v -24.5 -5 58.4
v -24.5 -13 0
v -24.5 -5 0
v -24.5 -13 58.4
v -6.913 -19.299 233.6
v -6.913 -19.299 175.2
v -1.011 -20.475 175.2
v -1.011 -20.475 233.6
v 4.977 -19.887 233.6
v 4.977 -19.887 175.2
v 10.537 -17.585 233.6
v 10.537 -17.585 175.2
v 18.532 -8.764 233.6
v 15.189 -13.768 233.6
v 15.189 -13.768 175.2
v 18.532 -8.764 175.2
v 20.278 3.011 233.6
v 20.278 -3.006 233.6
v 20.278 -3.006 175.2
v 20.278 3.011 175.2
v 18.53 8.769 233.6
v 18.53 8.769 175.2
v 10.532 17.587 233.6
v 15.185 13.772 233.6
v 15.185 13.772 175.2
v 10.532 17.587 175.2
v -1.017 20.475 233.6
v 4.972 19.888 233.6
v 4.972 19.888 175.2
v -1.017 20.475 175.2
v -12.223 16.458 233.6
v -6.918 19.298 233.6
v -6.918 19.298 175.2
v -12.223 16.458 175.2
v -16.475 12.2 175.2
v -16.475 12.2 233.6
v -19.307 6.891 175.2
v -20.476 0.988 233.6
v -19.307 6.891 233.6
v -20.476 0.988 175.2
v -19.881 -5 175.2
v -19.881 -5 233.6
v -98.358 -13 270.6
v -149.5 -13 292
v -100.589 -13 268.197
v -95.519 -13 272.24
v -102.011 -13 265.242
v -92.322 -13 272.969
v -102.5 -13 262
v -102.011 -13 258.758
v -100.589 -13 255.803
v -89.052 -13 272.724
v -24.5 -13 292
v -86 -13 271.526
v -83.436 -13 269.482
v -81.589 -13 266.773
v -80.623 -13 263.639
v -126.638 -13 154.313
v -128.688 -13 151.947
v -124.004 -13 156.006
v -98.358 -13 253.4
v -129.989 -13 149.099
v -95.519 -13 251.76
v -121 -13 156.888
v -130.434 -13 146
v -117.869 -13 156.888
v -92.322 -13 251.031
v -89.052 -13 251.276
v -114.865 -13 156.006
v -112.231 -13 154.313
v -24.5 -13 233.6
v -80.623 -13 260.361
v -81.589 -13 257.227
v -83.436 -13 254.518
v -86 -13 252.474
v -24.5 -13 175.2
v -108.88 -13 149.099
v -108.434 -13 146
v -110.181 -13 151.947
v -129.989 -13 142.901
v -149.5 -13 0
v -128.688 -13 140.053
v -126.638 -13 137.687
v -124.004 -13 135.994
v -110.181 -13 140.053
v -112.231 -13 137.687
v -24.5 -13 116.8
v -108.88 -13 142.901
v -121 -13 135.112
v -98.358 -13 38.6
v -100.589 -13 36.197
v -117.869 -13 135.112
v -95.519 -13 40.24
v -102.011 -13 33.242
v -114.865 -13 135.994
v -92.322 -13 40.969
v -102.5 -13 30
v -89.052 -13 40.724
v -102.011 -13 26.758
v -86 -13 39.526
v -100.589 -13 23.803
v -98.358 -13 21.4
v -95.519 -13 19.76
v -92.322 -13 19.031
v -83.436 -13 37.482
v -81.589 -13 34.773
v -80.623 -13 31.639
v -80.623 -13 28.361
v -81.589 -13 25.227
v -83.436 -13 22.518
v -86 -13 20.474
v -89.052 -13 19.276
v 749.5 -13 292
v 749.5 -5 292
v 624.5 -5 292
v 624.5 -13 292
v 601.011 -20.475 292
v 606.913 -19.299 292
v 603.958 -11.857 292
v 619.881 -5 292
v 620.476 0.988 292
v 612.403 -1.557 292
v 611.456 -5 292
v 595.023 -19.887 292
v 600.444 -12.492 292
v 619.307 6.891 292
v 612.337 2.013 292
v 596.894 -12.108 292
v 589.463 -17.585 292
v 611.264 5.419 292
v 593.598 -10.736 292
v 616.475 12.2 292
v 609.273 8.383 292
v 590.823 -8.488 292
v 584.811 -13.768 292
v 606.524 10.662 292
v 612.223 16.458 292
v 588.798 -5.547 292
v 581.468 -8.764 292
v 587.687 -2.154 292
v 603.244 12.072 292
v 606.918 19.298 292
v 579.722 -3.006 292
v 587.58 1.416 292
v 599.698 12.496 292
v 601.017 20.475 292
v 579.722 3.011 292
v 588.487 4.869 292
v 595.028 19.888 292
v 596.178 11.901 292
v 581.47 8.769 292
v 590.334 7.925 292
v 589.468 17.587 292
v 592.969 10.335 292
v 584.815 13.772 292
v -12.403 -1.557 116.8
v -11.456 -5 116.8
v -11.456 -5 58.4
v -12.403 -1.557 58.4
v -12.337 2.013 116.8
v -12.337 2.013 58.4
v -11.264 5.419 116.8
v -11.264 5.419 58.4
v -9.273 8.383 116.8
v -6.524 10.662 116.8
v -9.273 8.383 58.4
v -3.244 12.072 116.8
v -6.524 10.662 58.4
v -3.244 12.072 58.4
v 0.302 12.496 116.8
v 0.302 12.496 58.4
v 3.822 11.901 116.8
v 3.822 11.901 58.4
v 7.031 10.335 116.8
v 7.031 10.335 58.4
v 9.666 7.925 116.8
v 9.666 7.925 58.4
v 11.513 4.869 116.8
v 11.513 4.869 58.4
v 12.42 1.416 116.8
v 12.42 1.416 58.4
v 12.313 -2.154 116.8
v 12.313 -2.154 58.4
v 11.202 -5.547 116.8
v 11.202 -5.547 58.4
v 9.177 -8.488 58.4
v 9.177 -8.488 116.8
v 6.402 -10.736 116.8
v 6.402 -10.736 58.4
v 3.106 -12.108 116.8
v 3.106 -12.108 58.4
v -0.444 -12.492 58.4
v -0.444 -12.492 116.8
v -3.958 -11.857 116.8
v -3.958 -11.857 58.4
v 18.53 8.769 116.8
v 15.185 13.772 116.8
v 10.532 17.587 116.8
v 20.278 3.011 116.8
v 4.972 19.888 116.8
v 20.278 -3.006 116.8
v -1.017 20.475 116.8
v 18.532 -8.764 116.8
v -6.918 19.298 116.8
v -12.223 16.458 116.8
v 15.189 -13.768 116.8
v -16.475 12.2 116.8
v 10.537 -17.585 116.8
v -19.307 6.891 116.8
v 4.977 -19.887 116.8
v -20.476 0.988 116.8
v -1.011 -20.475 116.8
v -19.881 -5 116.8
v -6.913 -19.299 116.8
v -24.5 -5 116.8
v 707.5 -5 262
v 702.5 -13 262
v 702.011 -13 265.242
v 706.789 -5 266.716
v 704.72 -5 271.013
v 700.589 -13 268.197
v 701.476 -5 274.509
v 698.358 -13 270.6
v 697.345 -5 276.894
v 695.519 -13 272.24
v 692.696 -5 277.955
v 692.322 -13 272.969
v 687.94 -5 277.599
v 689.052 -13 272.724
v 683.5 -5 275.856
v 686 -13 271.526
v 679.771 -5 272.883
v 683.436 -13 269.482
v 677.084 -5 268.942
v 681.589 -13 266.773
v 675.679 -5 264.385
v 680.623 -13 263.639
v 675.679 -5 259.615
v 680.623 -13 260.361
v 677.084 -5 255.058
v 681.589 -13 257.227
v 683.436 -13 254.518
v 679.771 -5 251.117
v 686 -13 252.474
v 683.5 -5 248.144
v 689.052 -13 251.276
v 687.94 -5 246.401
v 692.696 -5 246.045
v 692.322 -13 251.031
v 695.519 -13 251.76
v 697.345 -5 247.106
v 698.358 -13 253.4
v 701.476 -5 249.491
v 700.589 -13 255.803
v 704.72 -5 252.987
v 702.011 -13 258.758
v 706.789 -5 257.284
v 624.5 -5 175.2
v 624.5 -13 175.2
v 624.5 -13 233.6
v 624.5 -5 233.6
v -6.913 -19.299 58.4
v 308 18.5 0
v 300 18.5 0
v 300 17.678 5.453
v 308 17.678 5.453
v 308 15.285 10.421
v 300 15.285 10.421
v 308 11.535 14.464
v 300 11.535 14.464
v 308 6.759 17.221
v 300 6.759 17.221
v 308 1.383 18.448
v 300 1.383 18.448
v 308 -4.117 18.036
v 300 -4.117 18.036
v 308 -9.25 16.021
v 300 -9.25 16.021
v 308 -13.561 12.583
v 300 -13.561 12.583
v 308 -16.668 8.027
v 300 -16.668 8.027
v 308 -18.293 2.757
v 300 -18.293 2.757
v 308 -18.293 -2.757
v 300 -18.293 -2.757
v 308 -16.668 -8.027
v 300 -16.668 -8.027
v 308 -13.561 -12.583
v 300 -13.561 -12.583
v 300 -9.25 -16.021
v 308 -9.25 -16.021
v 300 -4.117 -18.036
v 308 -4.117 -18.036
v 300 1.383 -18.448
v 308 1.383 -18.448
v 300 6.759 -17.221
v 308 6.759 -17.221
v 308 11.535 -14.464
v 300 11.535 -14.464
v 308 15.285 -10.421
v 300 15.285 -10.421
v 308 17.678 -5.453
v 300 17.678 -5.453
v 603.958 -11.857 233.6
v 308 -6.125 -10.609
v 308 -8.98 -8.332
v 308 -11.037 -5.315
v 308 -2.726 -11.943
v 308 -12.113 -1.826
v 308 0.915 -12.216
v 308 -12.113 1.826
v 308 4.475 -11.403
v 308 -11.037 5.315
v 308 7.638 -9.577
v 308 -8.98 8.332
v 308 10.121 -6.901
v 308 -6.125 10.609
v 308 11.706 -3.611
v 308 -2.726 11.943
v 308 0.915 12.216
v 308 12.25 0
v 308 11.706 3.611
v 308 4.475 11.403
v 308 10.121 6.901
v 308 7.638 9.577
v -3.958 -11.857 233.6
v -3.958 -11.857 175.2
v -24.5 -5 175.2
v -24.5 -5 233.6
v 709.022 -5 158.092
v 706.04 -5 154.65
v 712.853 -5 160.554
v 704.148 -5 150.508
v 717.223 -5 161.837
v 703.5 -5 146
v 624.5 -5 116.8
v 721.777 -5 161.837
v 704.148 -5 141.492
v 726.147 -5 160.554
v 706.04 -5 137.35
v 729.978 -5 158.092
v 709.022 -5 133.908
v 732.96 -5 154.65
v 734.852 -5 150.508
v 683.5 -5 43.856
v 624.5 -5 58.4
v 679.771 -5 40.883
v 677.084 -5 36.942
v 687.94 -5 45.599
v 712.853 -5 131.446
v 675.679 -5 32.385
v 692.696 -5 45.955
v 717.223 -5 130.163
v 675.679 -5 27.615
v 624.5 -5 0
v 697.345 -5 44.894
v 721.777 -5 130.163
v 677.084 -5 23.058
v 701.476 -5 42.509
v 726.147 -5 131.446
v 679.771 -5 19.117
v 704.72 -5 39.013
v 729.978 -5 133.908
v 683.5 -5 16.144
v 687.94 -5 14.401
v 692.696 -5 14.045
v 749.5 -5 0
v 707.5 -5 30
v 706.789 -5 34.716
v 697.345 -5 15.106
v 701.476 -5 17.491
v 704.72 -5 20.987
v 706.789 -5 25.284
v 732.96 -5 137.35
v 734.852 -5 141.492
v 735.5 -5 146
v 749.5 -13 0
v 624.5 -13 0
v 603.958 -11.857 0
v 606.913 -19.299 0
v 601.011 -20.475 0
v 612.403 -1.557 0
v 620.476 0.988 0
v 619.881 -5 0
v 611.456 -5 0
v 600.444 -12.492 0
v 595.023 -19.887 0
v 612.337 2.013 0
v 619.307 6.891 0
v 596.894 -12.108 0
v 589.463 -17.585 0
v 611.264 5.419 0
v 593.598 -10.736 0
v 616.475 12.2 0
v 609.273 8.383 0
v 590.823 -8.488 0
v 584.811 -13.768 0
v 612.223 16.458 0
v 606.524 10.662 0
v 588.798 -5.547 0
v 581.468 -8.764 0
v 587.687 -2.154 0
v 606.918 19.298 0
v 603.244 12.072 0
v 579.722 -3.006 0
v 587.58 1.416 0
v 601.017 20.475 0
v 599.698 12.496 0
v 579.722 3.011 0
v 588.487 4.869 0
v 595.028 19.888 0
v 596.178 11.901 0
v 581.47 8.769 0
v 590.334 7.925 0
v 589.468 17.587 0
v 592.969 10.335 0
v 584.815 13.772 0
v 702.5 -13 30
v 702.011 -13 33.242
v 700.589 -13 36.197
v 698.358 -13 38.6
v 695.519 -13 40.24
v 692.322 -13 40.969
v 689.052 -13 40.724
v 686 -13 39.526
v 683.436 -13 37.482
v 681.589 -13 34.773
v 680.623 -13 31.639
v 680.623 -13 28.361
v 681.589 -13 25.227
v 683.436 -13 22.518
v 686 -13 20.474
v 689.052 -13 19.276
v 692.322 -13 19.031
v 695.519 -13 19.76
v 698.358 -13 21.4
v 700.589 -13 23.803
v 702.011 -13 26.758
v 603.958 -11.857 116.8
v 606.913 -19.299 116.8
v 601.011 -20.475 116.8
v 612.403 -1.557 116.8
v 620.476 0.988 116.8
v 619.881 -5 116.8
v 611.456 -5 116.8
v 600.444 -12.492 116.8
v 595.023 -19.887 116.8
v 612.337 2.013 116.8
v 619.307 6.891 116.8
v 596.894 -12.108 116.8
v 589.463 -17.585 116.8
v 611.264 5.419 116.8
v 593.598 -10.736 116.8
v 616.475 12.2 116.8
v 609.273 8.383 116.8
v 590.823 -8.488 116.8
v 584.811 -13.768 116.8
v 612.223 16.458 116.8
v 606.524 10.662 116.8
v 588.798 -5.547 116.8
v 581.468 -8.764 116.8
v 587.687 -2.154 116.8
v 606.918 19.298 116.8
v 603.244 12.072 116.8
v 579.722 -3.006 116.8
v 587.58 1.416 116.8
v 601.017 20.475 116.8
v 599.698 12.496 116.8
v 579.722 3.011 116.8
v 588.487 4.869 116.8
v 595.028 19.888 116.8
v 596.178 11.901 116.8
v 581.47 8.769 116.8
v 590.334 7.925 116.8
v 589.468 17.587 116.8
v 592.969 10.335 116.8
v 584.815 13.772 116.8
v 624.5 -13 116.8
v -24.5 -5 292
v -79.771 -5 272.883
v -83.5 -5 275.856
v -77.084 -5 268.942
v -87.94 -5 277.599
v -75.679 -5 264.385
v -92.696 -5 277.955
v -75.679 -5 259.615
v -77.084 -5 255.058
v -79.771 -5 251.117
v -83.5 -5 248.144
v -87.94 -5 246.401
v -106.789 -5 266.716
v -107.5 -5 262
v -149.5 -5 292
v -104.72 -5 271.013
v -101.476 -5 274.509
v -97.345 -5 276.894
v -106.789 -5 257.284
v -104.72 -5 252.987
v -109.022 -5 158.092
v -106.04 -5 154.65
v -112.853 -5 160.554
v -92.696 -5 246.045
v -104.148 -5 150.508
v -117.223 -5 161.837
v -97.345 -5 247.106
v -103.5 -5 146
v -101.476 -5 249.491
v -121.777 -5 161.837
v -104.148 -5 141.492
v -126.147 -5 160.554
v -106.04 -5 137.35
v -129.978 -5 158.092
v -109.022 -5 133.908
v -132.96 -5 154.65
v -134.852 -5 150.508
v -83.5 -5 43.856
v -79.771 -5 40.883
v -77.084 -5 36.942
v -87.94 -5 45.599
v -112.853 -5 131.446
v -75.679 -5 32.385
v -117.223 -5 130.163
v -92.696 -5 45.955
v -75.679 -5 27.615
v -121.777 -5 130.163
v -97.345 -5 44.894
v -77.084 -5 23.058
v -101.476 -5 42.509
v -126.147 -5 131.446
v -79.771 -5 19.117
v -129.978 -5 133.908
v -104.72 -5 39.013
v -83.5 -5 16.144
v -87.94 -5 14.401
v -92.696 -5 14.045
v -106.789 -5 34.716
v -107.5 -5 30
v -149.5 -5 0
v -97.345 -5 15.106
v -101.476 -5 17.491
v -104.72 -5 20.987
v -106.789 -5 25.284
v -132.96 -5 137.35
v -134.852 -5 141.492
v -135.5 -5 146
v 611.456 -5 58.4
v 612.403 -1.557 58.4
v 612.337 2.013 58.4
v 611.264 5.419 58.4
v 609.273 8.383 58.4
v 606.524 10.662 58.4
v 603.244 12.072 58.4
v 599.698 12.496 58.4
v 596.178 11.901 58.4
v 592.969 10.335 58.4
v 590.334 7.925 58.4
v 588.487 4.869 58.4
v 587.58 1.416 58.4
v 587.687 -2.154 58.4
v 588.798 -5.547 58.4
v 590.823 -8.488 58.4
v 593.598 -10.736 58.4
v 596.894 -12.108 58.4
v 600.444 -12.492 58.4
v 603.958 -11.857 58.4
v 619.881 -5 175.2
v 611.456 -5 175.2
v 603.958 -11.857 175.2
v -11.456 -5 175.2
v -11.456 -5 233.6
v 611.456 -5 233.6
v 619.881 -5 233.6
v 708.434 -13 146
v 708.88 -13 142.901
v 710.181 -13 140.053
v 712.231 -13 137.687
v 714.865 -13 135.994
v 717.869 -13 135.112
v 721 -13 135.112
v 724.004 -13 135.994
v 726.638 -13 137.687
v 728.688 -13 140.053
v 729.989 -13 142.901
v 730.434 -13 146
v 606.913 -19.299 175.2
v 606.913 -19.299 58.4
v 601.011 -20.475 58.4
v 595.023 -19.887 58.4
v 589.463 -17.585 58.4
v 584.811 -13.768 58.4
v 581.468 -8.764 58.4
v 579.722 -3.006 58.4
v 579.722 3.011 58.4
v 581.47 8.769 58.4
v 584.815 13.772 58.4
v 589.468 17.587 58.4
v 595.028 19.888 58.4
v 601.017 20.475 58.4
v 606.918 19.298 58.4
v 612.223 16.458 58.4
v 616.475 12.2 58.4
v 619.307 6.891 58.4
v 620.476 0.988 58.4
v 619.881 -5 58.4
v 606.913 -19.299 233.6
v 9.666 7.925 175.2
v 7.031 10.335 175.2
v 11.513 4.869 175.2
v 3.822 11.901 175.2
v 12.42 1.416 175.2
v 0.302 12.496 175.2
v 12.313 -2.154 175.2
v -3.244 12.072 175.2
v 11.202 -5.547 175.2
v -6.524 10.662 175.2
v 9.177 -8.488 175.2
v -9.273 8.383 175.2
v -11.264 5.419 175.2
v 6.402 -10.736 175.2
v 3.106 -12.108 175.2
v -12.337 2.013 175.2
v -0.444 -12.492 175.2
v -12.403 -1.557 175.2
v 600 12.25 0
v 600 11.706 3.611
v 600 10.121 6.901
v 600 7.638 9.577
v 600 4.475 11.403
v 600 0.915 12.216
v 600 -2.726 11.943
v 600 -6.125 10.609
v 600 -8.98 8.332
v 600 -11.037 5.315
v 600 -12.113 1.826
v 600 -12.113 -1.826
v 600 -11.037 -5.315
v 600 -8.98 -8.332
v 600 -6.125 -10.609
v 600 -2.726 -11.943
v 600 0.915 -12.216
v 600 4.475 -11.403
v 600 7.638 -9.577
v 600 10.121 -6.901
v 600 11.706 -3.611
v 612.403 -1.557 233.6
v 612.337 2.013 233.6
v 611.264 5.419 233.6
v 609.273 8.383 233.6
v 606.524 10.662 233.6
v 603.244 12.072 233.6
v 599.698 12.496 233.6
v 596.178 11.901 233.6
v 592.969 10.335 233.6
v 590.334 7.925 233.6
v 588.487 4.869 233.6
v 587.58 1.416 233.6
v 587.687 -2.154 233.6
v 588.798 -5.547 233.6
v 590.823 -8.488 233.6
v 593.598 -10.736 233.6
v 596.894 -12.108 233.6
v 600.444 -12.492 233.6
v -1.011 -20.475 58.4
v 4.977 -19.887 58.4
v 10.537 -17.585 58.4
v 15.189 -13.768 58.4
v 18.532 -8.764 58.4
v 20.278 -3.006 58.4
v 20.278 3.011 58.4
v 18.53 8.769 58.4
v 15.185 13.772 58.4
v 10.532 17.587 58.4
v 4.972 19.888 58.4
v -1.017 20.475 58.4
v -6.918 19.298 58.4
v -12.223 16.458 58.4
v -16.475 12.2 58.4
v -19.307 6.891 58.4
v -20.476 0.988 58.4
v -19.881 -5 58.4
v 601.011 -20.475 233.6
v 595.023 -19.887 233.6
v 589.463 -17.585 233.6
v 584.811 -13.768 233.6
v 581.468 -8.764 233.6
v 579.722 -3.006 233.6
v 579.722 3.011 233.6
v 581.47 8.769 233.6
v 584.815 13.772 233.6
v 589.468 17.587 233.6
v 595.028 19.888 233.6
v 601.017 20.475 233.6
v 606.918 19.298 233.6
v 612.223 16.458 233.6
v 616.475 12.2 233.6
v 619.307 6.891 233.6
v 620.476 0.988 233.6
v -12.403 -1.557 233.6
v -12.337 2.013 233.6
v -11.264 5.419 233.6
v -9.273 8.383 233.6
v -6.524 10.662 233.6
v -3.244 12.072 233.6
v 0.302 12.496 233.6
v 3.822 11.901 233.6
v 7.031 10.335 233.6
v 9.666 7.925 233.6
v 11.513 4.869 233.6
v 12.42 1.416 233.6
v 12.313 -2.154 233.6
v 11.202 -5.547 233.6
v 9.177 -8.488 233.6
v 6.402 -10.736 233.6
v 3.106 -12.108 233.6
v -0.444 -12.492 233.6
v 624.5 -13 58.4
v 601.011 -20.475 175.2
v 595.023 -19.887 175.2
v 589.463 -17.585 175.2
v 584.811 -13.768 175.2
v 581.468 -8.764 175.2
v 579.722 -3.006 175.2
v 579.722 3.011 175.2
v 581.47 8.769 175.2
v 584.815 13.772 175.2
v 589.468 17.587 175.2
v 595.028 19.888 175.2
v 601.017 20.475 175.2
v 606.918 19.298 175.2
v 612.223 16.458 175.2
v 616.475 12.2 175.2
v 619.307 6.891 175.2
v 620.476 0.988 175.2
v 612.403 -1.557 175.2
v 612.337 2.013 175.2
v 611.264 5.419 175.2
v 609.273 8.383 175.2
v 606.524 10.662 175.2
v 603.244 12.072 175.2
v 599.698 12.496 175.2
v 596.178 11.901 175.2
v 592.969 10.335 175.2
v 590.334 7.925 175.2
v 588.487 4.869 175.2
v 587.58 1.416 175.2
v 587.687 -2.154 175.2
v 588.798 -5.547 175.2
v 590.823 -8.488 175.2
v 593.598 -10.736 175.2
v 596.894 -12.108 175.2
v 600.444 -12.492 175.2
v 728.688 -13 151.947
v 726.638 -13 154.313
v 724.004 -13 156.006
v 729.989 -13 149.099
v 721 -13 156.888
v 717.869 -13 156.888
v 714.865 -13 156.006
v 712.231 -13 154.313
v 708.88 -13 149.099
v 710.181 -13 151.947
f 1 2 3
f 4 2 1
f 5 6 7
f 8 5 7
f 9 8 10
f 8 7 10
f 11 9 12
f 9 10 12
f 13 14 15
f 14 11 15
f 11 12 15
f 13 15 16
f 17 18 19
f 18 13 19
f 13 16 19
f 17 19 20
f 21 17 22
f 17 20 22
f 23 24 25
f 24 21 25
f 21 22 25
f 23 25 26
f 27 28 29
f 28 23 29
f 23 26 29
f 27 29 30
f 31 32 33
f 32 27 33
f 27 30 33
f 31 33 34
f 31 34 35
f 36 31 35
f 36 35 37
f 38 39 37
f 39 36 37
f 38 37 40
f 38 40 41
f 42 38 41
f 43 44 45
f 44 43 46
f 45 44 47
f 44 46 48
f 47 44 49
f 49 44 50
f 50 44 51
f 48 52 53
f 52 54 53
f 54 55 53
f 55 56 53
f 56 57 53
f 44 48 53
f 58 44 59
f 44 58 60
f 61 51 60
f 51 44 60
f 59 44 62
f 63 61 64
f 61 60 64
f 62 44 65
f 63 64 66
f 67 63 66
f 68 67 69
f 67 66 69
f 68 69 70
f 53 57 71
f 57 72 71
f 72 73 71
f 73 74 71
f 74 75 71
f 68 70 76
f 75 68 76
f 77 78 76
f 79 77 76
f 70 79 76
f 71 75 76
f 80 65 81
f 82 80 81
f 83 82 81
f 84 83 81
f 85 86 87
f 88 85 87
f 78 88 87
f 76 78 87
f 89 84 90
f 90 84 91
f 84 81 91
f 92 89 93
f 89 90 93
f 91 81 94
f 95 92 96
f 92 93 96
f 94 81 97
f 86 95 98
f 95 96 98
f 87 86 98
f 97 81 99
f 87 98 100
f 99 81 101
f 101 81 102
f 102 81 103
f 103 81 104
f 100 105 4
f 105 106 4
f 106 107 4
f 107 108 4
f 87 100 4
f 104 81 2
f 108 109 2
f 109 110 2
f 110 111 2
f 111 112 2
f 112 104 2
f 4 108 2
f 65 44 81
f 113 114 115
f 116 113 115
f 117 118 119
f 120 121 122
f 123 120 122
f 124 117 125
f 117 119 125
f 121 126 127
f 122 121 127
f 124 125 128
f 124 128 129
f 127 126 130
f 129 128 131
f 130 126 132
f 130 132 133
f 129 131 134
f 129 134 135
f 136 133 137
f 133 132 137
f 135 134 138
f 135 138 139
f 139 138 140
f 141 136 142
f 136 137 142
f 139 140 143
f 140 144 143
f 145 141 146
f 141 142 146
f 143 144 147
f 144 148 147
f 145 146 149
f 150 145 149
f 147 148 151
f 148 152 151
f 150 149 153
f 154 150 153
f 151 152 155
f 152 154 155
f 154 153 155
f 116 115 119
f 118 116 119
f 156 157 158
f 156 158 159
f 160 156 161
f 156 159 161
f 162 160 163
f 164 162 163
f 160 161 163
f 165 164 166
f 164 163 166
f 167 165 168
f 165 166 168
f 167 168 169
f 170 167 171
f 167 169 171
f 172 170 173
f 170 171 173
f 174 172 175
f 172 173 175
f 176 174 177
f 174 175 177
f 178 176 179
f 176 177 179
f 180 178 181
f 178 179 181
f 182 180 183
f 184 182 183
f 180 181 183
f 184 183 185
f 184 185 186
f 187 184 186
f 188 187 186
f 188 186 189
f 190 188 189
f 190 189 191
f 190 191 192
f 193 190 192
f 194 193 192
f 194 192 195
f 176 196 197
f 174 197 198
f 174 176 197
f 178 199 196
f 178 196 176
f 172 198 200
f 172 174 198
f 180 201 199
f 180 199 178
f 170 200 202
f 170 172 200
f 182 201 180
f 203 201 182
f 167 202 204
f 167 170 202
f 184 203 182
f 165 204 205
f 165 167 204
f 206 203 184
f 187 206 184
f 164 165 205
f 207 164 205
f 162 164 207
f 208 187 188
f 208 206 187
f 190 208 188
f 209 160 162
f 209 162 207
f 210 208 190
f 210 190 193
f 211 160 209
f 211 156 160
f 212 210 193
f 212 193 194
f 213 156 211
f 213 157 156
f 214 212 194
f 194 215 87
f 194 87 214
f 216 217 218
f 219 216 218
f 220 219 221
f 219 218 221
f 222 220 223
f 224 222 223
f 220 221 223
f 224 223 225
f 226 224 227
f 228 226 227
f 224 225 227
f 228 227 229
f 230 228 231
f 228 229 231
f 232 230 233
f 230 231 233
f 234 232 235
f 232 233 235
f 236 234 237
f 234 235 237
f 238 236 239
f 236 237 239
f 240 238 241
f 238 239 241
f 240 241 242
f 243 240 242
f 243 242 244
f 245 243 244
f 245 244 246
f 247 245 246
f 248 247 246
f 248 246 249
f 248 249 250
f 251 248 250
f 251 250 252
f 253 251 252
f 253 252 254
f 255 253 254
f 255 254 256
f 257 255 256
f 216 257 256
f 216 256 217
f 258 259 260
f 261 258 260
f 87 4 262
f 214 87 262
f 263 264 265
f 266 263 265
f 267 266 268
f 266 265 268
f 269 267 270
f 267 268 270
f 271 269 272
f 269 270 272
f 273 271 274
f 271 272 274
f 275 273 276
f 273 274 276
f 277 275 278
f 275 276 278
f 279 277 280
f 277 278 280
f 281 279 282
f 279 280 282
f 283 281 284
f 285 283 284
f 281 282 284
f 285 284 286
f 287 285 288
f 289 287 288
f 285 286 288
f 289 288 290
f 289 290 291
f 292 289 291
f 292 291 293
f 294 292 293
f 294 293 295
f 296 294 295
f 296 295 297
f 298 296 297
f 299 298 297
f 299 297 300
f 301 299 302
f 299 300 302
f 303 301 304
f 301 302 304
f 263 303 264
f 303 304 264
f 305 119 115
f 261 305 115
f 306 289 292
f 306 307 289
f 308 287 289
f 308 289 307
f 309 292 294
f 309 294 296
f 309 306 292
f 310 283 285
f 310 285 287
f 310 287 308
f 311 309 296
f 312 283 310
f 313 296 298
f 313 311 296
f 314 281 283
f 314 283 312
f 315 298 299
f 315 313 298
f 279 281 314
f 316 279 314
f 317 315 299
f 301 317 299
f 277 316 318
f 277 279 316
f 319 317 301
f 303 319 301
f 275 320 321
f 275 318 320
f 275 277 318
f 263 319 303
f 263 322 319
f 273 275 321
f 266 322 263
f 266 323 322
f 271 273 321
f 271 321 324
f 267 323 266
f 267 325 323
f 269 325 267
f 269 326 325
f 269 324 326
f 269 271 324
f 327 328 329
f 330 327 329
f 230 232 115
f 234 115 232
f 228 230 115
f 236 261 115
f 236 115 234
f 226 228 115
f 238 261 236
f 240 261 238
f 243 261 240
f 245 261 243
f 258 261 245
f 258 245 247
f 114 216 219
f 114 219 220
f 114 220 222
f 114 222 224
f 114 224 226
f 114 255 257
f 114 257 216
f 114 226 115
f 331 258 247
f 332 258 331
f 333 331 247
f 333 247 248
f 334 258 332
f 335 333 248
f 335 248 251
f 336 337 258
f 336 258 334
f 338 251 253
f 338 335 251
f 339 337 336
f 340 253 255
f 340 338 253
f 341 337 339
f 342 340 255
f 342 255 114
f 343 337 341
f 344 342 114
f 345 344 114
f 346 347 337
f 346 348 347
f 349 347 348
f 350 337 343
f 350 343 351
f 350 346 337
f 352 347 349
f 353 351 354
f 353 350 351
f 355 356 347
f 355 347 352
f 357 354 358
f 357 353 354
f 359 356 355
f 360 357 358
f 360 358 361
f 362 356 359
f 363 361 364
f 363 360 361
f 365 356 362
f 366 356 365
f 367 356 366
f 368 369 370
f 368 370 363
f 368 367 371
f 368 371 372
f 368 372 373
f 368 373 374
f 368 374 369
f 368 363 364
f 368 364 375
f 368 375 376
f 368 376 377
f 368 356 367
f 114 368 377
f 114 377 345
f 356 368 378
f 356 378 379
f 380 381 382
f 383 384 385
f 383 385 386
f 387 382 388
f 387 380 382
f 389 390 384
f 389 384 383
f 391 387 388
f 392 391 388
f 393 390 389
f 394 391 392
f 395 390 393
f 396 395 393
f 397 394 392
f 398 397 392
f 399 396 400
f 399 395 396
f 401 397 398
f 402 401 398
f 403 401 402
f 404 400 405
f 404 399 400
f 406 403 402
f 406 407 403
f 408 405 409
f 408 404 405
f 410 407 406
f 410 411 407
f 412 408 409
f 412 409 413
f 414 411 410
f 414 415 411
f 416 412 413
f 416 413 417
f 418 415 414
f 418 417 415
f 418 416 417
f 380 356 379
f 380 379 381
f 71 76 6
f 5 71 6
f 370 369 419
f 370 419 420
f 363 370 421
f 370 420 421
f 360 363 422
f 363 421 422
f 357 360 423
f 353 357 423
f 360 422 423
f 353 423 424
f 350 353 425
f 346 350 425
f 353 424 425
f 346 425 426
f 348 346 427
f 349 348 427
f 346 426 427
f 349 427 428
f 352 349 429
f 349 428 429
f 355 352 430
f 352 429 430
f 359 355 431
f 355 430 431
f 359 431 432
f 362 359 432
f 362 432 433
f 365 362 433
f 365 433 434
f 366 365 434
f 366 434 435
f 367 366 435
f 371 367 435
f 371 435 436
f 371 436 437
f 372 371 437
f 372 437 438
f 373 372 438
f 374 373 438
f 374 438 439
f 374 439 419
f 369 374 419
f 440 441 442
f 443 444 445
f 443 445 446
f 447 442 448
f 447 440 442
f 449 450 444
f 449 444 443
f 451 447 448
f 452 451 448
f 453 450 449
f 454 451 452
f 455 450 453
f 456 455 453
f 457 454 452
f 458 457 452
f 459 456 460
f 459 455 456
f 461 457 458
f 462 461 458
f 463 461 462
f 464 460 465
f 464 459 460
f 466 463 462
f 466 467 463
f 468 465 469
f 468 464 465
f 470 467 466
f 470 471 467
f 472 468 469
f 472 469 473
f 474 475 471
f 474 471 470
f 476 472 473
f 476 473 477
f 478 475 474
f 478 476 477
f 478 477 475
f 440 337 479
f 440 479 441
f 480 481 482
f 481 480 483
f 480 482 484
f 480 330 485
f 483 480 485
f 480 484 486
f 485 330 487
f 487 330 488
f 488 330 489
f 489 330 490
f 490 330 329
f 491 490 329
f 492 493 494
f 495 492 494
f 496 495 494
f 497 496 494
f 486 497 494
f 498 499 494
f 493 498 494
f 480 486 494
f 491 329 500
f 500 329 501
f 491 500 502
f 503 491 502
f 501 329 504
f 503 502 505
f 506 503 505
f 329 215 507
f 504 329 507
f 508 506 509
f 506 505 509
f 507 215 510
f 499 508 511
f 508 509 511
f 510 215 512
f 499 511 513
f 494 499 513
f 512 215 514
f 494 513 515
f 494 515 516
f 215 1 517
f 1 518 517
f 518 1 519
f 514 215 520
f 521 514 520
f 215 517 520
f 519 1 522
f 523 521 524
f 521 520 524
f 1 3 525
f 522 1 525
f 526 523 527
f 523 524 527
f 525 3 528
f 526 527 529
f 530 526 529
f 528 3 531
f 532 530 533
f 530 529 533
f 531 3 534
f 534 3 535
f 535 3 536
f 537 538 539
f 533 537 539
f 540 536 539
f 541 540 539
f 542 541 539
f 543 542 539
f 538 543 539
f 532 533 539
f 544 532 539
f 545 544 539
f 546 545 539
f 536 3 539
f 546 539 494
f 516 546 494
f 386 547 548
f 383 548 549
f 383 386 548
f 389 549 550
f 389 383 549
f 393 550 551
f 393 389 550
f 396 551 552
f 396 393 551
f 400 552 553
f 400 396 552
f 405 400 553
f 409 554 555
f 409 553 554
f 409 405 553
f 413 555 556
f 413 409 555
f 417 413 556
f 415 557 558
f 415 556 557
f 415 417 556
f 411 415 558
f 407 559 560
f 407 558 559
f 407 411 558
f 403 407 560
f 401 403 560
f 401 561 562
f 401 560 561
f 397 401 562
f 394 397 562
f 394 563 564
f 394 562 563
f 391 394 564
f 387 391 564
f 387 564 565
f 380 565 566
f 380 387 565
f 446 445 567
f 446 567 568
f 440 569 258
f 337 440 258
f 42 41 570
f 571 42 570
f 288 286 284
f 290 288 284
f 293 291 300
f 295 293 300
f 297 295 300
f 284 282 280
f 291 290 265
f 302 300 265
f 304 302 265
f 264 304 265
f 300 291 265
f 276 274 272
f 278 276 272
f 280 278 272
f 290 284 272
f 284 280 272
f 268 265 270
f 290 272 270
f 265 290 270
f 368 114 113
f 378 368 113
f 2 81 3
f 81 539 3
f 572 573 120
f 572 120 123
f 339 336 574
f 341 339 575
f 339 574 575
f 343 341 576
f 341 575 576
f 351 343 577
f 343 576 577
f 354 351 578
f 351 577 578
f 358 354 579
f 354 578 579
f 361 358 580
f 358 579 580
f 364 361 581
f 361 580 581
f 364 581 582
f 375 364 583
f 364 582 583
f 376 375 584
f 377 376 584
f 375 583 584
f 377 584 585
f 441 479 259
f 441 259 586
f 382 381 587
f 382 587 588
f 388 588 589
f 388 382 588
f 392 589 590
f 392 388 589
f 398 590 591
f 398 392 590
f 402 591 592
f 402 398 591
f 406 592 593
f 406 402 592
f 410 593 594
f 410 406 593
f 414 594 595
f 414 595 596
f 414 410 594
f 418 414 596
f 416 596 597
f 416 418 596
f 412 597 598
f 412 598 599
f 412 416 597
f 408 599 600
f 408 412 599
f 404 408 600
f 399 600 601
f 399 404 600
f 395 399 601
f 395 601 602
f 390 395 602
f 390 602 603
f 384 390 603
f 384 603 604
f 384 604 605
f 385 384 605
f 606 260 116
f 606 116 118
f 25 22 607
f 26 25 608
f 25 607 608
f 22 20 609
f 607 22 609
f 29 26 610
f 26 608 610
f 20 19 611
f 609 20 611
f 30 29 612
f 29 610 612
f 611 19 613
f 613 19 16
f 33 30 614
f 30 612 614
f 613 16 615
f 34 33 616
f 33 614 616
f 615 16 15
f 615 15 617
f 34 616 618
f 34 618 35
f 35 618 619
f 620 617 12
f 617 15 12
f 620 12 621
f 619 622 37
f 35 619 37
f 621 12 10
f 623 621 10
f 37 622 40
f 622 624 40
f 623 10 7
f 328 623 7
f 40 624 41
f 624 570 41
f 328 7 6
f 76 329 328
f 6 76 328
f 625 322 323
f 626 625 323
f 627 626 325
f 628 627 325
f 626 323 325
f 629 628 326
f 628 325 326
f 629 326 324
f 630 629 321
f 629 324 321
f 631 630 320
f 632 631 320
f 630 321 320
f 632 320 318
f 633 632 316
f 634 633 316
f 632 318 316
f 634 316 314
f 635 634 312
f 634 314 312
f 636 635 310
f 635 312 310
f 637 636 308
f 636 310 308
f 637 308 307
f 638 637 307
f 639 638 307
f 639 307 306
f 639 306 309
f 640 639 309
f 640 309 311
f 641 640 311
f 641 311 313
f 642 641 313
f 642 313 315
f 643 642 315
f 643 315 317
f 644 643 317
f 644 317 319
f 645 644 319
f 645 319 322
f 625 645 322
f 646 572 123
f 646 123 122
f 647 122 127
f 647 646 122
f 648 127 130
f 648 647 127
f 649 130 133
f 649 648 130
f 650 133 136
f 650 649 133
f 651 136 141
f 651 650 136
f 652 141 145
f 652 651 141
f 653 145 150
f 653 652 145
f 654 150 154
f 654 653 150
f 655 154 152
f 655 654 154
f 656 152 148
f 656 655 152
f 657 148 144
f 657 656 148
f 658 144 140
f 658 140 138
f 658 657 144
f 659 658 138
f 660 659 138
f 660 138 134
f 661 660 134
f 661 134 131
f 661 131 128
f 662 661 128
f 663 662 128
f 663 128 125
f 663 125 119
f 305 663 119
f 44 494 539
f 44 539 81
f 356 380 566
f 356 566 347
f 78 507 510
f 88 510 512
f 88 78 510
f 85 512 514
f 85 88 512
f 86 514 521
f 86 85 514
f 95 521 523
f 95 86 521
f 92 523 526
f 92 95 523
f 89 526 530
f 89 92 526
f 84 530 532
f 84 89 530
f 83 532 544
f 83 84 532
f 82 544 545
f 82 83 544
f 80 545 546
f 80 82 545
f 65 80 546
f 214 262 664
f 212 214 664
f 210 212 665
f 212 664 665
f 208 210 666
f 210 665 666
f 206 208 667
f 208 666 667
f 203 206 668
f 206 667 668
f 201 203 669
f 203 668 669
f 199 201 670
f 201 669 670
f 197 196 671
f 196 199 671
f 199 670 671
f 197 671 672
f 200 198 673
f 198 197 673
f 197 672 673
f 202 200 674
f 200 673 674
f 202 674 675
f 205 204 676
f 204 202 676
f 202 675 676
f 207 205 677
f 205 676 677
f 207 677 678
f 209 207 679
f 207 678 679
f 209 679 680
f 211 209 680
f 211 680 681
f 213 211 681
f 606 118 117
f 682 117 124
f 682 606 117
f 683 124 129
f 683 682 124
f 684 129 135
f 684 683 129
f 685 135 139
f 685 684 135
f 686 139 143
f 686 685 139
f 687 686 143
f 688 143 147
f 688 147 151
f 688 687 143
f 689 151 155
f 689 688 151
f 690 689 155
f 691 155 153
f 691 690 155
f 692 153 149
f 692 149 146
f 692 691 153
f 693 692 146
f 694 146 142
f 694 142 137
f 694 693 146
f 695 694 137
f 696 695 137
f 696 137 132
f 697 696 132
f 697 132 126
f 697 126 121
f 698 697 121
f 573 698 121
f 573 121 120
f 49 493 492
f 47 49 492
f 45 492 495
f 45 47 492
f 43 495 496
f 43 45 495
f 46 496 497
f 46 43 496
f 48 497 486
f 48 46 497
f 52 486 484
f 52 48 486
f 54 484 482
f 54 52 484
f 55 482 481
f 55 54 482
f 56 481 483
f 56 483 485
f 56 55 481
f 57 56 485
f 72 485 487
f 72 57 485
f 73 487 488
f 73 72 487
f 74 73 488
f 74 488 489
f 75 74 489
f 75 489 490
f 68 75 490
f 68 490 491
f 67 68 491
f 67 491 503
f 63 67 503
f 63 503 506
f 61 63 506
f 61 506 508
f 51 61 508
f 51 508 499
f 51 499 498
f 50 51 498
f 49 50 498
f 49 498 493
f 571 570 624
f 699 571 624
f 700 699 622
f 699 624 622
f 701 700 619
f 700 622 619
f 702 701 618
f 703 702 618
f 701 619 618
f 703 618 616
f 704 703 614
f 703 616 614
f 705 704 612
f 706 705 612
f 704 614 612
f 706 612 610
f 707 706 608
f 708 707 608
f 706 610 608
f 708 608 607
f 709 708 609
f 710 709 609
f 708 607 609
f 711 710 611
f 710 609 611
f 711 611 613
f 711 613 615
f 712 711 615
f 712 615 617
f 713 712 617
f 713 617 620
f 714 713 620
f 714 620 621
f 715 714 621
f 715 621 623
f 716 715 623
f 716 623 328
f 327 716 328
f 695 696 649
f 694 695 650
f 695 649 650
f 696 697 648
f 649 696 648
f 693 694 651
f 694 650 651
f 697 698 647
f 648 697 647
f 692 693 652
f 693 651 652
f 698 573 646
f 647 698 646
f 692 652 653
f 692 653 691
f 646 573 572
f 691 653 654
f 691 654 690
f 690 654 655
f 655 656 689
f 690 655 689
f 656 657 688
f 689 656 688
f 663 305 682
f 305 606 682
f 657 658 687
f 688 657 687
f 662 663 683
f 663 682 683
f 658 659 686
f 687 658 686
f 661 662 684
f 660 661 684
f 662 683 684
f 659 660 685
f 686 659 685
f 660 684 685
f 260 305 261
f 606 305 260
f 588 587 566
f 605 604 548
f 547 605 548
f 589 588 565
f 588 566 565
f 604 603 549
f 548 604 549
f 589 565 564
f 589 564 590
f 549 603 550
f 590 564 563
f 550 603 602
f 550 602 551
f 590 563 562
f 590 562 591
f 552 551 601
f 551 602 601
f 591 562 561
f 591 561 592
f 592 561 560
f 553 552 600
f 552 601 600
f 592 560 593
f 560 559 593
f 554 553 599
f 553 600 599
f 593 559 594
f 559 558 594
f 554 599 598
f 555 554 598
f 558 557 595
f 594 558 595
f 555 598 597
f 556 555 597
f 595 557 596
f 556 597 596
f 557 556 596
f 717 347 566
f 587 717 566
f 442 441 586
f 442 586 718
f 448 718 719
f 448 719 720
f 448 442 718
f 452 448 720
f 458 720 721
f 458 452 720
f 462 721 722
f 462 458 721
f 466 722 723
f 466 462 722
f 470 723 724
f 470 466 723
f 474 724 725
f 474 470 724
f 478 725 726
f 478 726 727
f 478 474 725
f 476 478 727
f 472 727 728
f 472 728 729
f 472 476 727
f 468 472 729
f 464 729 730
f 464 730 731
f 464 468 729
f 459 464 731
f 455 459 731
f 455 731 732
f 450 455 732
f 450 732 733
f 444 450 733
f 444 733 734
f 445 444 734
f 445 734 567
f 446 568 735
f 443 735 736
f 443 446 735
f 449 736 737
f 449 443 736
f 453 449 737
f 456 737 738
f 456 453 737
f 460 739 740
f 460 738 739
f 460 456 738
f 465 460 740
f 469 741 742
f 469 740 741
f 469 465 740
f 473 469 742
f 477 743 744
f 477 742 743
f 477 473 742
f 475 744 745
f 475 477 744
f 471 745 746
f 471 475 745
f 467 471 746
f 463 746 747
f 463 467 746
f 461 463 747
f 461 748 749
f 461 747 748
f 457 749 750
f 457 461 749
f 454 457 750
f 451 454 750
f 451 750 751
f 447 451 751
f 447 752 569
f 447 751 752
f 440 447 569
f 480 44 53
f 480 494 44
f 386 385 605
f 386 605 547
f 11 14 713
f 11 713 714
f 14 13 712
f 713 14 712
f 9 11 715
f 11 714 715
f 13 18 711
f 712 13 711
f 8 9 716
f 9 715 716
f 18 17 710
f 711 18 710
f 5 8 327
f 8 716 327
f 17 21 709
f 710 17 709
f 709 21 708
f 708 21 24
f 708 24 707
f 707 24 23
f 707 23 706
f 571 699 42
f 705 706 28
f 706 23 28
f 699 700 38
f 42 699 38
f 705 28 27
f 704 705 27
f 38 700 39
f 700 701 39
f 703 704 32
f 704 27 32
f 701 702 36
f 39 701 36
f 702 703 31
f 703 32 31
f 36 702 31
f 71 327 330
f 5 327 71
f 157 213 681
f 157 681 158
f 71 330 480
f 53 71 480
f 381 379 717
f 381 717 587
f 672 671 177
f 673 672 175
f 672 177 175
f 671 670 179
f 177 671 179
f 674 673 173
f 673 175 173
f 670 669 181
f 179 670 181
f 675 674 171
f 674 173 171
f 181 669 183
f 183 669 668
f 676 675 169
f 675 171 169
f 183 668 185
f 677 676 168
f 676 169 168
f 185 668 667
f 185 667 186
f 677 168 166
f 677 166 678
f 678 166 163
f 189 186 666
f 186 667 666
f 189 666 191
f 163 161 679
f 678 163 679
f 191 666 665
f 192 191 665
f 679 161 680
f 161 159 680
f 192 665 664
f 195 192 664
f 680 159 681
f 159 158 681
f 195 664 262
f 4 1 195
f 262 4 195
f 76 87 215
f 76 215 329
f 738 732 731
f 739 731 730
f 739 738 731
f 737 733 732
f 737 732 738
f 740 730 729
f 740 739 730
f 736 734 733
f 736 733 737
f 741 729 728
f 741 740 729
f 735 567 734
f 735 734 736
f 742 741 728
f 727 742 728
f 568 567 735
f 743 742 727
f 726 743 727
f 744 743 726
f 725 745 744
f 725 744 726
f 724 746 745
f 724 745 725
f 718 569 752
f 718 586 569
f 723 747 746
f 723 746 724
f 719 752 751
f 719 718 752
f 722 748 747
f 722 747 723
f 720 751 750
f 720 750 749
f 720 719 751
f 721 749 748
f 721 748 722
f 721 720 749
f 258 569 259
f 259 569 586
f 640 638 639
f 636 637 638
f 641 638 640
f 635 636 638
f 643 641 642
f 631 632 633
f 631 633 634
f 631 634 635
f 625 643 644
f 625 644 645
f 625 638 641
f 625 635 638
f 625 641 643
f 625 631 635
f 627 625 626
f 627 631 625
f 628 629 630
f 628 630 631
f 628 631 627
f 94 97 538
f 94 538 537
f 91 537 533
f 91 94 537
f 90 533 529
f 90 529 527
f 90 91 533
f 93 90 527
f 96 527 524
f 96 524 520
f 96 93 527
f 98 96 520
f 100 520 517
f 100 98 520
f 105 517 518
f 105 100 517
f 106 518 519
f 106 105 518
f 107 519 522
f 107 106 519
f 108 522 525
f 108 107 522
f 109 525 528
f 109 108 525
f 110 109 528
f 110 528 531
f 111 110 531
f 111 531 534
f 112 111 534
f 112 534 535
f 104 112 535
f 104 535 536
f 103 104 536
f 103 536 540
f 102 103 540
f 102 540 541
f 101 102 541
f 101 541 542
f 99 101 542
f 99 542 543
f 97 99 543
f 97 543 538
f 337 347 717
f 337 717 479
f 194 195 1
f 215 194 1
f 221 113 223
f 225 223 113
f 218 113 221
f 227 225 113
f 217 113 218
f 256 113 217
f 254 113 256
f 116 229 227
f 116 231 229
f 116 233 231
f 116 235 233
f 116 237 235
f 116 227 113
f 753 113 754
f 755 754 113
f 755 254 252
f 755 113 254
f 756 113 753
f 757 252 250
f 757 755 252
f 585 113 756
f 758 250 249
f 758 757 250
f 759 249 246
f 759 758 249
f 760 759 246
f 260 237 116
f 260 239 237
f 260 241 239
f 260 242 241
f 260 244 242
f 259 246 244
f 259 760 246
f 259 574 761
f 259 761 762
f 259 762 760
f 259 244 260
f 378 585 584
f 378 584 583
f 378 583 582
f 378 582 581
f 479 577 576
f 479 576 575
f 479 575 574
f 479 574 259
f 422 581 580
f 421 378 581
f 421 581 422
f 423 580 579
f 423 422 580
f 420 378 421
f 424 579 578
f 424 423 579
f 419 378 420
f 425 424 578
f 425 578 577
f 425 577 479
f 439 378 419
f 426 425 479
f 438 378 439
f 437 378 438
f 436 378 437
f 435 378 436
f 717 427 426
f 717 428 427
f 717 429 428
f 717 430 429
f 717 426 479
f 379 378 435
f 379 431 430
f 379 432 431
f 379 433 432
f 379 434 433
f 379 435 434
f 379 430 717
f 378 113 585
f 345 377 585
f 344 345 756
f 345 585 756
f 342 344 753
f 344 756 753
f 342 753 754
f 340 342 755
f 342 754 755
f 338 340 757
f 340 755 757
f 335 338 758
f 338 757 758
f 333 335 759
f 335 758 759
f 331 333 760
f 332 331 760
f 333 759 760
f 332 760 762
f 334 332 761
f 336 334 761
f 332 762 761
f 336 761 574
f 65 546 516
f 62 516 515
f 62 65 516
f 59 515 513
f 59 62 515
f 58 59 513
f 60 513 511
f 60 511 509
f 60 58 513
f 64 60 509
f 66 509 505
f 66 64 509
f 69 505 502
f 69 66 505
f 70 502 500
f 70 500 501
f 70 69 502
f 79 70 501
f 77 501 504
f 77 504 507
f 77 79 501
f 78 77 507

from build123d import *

# Parameters (mm, degrees)
F1_DEPTH  = 292
F2_R      = 16
F3_R      = 11
F10_W     = 50
F10_H     = 58.4
F11_DEPTH = 50
F7_W      = 50
F7_H      = 58.4
F12_DEPTH = 50
F13_R     = 12.25
F14_DEPTH = 300
F13_R_2   = 18.5
F15_DEPTH = 8


with BuildPart() as f1:
    # F0 (on Top) → F1 (new body)
    with BuildSketch(Plane.XY):
        with BuildLine():
            Line((-24.5, -13), (-6.9125695665, -19.2993881247))
            ThreePointArc((-6.9125695665, -19.2993881247), (15.1852087826, 13.7716895924), (-19.8808953521, -5))
            Line((-19.8808953521, -5), (-11.4564392374, -5))
            ThreePointArc((-11.4564392374, -5), (8.4352692932, 9.2247618913), (-3.9577761068, -11.8568970767))
            Line((-3.9577761068, -11.8568970767), (-24.5, -5))
            Line((-24.5, -5), (-149.5, -5))
            Line((-149.5, -5), (-149.5, -13))
            Line((-149.5, -13), (-24.5, -13))
        make_face()
    extrude(amount=F1_DEPTH)

    # F2 (on face) → F4 section 0
    with BuildSketch(Plane(origin=(0, -5, 0), x_dir=(-1, 0, 0), z_dir=(0, 1, 0))):
        with Locations((91.5, 262)):
            Circle(F2_R)
    # F3 (on face) → F4 section 1
    with BuildSketch(Plane.XZ.offset(13)):
        with Locations((-91.5, 262)):
            Circle(F3_R)
    loft(mode=Mode.SUBTRACT)

    # F2 (on face) → F5 section 0
    with BuildSketch(Plane(origin=(0, -5, 0), x_dir=(-1, 0, 0), z_dir=(0, 1, 0))):
        with Locations((119.5, 146)):
            Circle(F2_R)
    # F3 (on face) → F5 section 1
    with BuildSketch(Plane.XZ.offset(13)):
        with Locations((-119.4343939424, 146)):
            Circle(F3_R)
    loft(mode=Mode.SUBTRACT)

    # F2 (on face) → F6 section 0
    with BuildSketch(Plane(origin=(0, -5, 0), x_dir=(-1, 0, 0), z_dir=(0, 1, 0))):
        with Locations((91.5, 30)):
            Circle(F2_R)
    # F3 (on face) → F6 section 1
    with BuildSketch(Plane.XZ.offset(13)):
        with Locations((-91.5, 30)):
            Circle(F3_R)
    loft(mode=Mode.SUBTRACT)


with BuildPart() as f9_1:
    # F9: instance of F1
    add(f1.part.mirror(Plane.YZ.offset(300)))

    # F10 (on face) → F11 (cut, symmetric)
    with BuildSketch(Plane(origin=(0, -5, 0), x_dir=(-1, 0, 0), z_dir=(0, 1, 0))):
        with Locations((-599.5, 204.4)):
            Rectangle(F10_W, F10_H)
        with Locations((-599.5, 87.6)):
            Rectangle(F10_W, F10_H)
    extrude(amount=F11_DEPTH, both=True, mode=Mode.SUBTRACT)


with BuildPart() as f1_1:
    add(f1.part)

    # F7 (on face) → F12 (cut, symmetric)
    with BuildSketch(Plane(origin=(0, -5, 0), x_dir=(-1, 0, 0), z_dir=(0, 1, 0))):
        with Locations((-0.5, 29.2)):
            Rectangle(F7_W, F7_H)
        with Locations((-0.5, 146)):
            Rectangle(F7_W, F7_H)
        with Locations((-0.5, 262.8)):
            Rectangle(F7_W, F7_H)
    extrude(amount=F12_DEPTH, both=True, mode=Mode.SUBTRACT)


with BuildPart() as f14:
    # F13 (on offset) → F14 (new body)
    with BuildSketch(Plane.YZ.offset(300)):
        Circle(F13_R)
    extrude(amount=F14_DEPTH)

    # F13 (on offset) → F15 (join)
    with BuildSketch(Plane.YZ.offset(300)):
        Circle(F13_R_2)
        Circle(F13_R, mode=Mode.SUBTRACT)
    extrude(amount=F15_DEPTH)


solid = Compound([f9_1.part, f1_1.part, f14.part])
